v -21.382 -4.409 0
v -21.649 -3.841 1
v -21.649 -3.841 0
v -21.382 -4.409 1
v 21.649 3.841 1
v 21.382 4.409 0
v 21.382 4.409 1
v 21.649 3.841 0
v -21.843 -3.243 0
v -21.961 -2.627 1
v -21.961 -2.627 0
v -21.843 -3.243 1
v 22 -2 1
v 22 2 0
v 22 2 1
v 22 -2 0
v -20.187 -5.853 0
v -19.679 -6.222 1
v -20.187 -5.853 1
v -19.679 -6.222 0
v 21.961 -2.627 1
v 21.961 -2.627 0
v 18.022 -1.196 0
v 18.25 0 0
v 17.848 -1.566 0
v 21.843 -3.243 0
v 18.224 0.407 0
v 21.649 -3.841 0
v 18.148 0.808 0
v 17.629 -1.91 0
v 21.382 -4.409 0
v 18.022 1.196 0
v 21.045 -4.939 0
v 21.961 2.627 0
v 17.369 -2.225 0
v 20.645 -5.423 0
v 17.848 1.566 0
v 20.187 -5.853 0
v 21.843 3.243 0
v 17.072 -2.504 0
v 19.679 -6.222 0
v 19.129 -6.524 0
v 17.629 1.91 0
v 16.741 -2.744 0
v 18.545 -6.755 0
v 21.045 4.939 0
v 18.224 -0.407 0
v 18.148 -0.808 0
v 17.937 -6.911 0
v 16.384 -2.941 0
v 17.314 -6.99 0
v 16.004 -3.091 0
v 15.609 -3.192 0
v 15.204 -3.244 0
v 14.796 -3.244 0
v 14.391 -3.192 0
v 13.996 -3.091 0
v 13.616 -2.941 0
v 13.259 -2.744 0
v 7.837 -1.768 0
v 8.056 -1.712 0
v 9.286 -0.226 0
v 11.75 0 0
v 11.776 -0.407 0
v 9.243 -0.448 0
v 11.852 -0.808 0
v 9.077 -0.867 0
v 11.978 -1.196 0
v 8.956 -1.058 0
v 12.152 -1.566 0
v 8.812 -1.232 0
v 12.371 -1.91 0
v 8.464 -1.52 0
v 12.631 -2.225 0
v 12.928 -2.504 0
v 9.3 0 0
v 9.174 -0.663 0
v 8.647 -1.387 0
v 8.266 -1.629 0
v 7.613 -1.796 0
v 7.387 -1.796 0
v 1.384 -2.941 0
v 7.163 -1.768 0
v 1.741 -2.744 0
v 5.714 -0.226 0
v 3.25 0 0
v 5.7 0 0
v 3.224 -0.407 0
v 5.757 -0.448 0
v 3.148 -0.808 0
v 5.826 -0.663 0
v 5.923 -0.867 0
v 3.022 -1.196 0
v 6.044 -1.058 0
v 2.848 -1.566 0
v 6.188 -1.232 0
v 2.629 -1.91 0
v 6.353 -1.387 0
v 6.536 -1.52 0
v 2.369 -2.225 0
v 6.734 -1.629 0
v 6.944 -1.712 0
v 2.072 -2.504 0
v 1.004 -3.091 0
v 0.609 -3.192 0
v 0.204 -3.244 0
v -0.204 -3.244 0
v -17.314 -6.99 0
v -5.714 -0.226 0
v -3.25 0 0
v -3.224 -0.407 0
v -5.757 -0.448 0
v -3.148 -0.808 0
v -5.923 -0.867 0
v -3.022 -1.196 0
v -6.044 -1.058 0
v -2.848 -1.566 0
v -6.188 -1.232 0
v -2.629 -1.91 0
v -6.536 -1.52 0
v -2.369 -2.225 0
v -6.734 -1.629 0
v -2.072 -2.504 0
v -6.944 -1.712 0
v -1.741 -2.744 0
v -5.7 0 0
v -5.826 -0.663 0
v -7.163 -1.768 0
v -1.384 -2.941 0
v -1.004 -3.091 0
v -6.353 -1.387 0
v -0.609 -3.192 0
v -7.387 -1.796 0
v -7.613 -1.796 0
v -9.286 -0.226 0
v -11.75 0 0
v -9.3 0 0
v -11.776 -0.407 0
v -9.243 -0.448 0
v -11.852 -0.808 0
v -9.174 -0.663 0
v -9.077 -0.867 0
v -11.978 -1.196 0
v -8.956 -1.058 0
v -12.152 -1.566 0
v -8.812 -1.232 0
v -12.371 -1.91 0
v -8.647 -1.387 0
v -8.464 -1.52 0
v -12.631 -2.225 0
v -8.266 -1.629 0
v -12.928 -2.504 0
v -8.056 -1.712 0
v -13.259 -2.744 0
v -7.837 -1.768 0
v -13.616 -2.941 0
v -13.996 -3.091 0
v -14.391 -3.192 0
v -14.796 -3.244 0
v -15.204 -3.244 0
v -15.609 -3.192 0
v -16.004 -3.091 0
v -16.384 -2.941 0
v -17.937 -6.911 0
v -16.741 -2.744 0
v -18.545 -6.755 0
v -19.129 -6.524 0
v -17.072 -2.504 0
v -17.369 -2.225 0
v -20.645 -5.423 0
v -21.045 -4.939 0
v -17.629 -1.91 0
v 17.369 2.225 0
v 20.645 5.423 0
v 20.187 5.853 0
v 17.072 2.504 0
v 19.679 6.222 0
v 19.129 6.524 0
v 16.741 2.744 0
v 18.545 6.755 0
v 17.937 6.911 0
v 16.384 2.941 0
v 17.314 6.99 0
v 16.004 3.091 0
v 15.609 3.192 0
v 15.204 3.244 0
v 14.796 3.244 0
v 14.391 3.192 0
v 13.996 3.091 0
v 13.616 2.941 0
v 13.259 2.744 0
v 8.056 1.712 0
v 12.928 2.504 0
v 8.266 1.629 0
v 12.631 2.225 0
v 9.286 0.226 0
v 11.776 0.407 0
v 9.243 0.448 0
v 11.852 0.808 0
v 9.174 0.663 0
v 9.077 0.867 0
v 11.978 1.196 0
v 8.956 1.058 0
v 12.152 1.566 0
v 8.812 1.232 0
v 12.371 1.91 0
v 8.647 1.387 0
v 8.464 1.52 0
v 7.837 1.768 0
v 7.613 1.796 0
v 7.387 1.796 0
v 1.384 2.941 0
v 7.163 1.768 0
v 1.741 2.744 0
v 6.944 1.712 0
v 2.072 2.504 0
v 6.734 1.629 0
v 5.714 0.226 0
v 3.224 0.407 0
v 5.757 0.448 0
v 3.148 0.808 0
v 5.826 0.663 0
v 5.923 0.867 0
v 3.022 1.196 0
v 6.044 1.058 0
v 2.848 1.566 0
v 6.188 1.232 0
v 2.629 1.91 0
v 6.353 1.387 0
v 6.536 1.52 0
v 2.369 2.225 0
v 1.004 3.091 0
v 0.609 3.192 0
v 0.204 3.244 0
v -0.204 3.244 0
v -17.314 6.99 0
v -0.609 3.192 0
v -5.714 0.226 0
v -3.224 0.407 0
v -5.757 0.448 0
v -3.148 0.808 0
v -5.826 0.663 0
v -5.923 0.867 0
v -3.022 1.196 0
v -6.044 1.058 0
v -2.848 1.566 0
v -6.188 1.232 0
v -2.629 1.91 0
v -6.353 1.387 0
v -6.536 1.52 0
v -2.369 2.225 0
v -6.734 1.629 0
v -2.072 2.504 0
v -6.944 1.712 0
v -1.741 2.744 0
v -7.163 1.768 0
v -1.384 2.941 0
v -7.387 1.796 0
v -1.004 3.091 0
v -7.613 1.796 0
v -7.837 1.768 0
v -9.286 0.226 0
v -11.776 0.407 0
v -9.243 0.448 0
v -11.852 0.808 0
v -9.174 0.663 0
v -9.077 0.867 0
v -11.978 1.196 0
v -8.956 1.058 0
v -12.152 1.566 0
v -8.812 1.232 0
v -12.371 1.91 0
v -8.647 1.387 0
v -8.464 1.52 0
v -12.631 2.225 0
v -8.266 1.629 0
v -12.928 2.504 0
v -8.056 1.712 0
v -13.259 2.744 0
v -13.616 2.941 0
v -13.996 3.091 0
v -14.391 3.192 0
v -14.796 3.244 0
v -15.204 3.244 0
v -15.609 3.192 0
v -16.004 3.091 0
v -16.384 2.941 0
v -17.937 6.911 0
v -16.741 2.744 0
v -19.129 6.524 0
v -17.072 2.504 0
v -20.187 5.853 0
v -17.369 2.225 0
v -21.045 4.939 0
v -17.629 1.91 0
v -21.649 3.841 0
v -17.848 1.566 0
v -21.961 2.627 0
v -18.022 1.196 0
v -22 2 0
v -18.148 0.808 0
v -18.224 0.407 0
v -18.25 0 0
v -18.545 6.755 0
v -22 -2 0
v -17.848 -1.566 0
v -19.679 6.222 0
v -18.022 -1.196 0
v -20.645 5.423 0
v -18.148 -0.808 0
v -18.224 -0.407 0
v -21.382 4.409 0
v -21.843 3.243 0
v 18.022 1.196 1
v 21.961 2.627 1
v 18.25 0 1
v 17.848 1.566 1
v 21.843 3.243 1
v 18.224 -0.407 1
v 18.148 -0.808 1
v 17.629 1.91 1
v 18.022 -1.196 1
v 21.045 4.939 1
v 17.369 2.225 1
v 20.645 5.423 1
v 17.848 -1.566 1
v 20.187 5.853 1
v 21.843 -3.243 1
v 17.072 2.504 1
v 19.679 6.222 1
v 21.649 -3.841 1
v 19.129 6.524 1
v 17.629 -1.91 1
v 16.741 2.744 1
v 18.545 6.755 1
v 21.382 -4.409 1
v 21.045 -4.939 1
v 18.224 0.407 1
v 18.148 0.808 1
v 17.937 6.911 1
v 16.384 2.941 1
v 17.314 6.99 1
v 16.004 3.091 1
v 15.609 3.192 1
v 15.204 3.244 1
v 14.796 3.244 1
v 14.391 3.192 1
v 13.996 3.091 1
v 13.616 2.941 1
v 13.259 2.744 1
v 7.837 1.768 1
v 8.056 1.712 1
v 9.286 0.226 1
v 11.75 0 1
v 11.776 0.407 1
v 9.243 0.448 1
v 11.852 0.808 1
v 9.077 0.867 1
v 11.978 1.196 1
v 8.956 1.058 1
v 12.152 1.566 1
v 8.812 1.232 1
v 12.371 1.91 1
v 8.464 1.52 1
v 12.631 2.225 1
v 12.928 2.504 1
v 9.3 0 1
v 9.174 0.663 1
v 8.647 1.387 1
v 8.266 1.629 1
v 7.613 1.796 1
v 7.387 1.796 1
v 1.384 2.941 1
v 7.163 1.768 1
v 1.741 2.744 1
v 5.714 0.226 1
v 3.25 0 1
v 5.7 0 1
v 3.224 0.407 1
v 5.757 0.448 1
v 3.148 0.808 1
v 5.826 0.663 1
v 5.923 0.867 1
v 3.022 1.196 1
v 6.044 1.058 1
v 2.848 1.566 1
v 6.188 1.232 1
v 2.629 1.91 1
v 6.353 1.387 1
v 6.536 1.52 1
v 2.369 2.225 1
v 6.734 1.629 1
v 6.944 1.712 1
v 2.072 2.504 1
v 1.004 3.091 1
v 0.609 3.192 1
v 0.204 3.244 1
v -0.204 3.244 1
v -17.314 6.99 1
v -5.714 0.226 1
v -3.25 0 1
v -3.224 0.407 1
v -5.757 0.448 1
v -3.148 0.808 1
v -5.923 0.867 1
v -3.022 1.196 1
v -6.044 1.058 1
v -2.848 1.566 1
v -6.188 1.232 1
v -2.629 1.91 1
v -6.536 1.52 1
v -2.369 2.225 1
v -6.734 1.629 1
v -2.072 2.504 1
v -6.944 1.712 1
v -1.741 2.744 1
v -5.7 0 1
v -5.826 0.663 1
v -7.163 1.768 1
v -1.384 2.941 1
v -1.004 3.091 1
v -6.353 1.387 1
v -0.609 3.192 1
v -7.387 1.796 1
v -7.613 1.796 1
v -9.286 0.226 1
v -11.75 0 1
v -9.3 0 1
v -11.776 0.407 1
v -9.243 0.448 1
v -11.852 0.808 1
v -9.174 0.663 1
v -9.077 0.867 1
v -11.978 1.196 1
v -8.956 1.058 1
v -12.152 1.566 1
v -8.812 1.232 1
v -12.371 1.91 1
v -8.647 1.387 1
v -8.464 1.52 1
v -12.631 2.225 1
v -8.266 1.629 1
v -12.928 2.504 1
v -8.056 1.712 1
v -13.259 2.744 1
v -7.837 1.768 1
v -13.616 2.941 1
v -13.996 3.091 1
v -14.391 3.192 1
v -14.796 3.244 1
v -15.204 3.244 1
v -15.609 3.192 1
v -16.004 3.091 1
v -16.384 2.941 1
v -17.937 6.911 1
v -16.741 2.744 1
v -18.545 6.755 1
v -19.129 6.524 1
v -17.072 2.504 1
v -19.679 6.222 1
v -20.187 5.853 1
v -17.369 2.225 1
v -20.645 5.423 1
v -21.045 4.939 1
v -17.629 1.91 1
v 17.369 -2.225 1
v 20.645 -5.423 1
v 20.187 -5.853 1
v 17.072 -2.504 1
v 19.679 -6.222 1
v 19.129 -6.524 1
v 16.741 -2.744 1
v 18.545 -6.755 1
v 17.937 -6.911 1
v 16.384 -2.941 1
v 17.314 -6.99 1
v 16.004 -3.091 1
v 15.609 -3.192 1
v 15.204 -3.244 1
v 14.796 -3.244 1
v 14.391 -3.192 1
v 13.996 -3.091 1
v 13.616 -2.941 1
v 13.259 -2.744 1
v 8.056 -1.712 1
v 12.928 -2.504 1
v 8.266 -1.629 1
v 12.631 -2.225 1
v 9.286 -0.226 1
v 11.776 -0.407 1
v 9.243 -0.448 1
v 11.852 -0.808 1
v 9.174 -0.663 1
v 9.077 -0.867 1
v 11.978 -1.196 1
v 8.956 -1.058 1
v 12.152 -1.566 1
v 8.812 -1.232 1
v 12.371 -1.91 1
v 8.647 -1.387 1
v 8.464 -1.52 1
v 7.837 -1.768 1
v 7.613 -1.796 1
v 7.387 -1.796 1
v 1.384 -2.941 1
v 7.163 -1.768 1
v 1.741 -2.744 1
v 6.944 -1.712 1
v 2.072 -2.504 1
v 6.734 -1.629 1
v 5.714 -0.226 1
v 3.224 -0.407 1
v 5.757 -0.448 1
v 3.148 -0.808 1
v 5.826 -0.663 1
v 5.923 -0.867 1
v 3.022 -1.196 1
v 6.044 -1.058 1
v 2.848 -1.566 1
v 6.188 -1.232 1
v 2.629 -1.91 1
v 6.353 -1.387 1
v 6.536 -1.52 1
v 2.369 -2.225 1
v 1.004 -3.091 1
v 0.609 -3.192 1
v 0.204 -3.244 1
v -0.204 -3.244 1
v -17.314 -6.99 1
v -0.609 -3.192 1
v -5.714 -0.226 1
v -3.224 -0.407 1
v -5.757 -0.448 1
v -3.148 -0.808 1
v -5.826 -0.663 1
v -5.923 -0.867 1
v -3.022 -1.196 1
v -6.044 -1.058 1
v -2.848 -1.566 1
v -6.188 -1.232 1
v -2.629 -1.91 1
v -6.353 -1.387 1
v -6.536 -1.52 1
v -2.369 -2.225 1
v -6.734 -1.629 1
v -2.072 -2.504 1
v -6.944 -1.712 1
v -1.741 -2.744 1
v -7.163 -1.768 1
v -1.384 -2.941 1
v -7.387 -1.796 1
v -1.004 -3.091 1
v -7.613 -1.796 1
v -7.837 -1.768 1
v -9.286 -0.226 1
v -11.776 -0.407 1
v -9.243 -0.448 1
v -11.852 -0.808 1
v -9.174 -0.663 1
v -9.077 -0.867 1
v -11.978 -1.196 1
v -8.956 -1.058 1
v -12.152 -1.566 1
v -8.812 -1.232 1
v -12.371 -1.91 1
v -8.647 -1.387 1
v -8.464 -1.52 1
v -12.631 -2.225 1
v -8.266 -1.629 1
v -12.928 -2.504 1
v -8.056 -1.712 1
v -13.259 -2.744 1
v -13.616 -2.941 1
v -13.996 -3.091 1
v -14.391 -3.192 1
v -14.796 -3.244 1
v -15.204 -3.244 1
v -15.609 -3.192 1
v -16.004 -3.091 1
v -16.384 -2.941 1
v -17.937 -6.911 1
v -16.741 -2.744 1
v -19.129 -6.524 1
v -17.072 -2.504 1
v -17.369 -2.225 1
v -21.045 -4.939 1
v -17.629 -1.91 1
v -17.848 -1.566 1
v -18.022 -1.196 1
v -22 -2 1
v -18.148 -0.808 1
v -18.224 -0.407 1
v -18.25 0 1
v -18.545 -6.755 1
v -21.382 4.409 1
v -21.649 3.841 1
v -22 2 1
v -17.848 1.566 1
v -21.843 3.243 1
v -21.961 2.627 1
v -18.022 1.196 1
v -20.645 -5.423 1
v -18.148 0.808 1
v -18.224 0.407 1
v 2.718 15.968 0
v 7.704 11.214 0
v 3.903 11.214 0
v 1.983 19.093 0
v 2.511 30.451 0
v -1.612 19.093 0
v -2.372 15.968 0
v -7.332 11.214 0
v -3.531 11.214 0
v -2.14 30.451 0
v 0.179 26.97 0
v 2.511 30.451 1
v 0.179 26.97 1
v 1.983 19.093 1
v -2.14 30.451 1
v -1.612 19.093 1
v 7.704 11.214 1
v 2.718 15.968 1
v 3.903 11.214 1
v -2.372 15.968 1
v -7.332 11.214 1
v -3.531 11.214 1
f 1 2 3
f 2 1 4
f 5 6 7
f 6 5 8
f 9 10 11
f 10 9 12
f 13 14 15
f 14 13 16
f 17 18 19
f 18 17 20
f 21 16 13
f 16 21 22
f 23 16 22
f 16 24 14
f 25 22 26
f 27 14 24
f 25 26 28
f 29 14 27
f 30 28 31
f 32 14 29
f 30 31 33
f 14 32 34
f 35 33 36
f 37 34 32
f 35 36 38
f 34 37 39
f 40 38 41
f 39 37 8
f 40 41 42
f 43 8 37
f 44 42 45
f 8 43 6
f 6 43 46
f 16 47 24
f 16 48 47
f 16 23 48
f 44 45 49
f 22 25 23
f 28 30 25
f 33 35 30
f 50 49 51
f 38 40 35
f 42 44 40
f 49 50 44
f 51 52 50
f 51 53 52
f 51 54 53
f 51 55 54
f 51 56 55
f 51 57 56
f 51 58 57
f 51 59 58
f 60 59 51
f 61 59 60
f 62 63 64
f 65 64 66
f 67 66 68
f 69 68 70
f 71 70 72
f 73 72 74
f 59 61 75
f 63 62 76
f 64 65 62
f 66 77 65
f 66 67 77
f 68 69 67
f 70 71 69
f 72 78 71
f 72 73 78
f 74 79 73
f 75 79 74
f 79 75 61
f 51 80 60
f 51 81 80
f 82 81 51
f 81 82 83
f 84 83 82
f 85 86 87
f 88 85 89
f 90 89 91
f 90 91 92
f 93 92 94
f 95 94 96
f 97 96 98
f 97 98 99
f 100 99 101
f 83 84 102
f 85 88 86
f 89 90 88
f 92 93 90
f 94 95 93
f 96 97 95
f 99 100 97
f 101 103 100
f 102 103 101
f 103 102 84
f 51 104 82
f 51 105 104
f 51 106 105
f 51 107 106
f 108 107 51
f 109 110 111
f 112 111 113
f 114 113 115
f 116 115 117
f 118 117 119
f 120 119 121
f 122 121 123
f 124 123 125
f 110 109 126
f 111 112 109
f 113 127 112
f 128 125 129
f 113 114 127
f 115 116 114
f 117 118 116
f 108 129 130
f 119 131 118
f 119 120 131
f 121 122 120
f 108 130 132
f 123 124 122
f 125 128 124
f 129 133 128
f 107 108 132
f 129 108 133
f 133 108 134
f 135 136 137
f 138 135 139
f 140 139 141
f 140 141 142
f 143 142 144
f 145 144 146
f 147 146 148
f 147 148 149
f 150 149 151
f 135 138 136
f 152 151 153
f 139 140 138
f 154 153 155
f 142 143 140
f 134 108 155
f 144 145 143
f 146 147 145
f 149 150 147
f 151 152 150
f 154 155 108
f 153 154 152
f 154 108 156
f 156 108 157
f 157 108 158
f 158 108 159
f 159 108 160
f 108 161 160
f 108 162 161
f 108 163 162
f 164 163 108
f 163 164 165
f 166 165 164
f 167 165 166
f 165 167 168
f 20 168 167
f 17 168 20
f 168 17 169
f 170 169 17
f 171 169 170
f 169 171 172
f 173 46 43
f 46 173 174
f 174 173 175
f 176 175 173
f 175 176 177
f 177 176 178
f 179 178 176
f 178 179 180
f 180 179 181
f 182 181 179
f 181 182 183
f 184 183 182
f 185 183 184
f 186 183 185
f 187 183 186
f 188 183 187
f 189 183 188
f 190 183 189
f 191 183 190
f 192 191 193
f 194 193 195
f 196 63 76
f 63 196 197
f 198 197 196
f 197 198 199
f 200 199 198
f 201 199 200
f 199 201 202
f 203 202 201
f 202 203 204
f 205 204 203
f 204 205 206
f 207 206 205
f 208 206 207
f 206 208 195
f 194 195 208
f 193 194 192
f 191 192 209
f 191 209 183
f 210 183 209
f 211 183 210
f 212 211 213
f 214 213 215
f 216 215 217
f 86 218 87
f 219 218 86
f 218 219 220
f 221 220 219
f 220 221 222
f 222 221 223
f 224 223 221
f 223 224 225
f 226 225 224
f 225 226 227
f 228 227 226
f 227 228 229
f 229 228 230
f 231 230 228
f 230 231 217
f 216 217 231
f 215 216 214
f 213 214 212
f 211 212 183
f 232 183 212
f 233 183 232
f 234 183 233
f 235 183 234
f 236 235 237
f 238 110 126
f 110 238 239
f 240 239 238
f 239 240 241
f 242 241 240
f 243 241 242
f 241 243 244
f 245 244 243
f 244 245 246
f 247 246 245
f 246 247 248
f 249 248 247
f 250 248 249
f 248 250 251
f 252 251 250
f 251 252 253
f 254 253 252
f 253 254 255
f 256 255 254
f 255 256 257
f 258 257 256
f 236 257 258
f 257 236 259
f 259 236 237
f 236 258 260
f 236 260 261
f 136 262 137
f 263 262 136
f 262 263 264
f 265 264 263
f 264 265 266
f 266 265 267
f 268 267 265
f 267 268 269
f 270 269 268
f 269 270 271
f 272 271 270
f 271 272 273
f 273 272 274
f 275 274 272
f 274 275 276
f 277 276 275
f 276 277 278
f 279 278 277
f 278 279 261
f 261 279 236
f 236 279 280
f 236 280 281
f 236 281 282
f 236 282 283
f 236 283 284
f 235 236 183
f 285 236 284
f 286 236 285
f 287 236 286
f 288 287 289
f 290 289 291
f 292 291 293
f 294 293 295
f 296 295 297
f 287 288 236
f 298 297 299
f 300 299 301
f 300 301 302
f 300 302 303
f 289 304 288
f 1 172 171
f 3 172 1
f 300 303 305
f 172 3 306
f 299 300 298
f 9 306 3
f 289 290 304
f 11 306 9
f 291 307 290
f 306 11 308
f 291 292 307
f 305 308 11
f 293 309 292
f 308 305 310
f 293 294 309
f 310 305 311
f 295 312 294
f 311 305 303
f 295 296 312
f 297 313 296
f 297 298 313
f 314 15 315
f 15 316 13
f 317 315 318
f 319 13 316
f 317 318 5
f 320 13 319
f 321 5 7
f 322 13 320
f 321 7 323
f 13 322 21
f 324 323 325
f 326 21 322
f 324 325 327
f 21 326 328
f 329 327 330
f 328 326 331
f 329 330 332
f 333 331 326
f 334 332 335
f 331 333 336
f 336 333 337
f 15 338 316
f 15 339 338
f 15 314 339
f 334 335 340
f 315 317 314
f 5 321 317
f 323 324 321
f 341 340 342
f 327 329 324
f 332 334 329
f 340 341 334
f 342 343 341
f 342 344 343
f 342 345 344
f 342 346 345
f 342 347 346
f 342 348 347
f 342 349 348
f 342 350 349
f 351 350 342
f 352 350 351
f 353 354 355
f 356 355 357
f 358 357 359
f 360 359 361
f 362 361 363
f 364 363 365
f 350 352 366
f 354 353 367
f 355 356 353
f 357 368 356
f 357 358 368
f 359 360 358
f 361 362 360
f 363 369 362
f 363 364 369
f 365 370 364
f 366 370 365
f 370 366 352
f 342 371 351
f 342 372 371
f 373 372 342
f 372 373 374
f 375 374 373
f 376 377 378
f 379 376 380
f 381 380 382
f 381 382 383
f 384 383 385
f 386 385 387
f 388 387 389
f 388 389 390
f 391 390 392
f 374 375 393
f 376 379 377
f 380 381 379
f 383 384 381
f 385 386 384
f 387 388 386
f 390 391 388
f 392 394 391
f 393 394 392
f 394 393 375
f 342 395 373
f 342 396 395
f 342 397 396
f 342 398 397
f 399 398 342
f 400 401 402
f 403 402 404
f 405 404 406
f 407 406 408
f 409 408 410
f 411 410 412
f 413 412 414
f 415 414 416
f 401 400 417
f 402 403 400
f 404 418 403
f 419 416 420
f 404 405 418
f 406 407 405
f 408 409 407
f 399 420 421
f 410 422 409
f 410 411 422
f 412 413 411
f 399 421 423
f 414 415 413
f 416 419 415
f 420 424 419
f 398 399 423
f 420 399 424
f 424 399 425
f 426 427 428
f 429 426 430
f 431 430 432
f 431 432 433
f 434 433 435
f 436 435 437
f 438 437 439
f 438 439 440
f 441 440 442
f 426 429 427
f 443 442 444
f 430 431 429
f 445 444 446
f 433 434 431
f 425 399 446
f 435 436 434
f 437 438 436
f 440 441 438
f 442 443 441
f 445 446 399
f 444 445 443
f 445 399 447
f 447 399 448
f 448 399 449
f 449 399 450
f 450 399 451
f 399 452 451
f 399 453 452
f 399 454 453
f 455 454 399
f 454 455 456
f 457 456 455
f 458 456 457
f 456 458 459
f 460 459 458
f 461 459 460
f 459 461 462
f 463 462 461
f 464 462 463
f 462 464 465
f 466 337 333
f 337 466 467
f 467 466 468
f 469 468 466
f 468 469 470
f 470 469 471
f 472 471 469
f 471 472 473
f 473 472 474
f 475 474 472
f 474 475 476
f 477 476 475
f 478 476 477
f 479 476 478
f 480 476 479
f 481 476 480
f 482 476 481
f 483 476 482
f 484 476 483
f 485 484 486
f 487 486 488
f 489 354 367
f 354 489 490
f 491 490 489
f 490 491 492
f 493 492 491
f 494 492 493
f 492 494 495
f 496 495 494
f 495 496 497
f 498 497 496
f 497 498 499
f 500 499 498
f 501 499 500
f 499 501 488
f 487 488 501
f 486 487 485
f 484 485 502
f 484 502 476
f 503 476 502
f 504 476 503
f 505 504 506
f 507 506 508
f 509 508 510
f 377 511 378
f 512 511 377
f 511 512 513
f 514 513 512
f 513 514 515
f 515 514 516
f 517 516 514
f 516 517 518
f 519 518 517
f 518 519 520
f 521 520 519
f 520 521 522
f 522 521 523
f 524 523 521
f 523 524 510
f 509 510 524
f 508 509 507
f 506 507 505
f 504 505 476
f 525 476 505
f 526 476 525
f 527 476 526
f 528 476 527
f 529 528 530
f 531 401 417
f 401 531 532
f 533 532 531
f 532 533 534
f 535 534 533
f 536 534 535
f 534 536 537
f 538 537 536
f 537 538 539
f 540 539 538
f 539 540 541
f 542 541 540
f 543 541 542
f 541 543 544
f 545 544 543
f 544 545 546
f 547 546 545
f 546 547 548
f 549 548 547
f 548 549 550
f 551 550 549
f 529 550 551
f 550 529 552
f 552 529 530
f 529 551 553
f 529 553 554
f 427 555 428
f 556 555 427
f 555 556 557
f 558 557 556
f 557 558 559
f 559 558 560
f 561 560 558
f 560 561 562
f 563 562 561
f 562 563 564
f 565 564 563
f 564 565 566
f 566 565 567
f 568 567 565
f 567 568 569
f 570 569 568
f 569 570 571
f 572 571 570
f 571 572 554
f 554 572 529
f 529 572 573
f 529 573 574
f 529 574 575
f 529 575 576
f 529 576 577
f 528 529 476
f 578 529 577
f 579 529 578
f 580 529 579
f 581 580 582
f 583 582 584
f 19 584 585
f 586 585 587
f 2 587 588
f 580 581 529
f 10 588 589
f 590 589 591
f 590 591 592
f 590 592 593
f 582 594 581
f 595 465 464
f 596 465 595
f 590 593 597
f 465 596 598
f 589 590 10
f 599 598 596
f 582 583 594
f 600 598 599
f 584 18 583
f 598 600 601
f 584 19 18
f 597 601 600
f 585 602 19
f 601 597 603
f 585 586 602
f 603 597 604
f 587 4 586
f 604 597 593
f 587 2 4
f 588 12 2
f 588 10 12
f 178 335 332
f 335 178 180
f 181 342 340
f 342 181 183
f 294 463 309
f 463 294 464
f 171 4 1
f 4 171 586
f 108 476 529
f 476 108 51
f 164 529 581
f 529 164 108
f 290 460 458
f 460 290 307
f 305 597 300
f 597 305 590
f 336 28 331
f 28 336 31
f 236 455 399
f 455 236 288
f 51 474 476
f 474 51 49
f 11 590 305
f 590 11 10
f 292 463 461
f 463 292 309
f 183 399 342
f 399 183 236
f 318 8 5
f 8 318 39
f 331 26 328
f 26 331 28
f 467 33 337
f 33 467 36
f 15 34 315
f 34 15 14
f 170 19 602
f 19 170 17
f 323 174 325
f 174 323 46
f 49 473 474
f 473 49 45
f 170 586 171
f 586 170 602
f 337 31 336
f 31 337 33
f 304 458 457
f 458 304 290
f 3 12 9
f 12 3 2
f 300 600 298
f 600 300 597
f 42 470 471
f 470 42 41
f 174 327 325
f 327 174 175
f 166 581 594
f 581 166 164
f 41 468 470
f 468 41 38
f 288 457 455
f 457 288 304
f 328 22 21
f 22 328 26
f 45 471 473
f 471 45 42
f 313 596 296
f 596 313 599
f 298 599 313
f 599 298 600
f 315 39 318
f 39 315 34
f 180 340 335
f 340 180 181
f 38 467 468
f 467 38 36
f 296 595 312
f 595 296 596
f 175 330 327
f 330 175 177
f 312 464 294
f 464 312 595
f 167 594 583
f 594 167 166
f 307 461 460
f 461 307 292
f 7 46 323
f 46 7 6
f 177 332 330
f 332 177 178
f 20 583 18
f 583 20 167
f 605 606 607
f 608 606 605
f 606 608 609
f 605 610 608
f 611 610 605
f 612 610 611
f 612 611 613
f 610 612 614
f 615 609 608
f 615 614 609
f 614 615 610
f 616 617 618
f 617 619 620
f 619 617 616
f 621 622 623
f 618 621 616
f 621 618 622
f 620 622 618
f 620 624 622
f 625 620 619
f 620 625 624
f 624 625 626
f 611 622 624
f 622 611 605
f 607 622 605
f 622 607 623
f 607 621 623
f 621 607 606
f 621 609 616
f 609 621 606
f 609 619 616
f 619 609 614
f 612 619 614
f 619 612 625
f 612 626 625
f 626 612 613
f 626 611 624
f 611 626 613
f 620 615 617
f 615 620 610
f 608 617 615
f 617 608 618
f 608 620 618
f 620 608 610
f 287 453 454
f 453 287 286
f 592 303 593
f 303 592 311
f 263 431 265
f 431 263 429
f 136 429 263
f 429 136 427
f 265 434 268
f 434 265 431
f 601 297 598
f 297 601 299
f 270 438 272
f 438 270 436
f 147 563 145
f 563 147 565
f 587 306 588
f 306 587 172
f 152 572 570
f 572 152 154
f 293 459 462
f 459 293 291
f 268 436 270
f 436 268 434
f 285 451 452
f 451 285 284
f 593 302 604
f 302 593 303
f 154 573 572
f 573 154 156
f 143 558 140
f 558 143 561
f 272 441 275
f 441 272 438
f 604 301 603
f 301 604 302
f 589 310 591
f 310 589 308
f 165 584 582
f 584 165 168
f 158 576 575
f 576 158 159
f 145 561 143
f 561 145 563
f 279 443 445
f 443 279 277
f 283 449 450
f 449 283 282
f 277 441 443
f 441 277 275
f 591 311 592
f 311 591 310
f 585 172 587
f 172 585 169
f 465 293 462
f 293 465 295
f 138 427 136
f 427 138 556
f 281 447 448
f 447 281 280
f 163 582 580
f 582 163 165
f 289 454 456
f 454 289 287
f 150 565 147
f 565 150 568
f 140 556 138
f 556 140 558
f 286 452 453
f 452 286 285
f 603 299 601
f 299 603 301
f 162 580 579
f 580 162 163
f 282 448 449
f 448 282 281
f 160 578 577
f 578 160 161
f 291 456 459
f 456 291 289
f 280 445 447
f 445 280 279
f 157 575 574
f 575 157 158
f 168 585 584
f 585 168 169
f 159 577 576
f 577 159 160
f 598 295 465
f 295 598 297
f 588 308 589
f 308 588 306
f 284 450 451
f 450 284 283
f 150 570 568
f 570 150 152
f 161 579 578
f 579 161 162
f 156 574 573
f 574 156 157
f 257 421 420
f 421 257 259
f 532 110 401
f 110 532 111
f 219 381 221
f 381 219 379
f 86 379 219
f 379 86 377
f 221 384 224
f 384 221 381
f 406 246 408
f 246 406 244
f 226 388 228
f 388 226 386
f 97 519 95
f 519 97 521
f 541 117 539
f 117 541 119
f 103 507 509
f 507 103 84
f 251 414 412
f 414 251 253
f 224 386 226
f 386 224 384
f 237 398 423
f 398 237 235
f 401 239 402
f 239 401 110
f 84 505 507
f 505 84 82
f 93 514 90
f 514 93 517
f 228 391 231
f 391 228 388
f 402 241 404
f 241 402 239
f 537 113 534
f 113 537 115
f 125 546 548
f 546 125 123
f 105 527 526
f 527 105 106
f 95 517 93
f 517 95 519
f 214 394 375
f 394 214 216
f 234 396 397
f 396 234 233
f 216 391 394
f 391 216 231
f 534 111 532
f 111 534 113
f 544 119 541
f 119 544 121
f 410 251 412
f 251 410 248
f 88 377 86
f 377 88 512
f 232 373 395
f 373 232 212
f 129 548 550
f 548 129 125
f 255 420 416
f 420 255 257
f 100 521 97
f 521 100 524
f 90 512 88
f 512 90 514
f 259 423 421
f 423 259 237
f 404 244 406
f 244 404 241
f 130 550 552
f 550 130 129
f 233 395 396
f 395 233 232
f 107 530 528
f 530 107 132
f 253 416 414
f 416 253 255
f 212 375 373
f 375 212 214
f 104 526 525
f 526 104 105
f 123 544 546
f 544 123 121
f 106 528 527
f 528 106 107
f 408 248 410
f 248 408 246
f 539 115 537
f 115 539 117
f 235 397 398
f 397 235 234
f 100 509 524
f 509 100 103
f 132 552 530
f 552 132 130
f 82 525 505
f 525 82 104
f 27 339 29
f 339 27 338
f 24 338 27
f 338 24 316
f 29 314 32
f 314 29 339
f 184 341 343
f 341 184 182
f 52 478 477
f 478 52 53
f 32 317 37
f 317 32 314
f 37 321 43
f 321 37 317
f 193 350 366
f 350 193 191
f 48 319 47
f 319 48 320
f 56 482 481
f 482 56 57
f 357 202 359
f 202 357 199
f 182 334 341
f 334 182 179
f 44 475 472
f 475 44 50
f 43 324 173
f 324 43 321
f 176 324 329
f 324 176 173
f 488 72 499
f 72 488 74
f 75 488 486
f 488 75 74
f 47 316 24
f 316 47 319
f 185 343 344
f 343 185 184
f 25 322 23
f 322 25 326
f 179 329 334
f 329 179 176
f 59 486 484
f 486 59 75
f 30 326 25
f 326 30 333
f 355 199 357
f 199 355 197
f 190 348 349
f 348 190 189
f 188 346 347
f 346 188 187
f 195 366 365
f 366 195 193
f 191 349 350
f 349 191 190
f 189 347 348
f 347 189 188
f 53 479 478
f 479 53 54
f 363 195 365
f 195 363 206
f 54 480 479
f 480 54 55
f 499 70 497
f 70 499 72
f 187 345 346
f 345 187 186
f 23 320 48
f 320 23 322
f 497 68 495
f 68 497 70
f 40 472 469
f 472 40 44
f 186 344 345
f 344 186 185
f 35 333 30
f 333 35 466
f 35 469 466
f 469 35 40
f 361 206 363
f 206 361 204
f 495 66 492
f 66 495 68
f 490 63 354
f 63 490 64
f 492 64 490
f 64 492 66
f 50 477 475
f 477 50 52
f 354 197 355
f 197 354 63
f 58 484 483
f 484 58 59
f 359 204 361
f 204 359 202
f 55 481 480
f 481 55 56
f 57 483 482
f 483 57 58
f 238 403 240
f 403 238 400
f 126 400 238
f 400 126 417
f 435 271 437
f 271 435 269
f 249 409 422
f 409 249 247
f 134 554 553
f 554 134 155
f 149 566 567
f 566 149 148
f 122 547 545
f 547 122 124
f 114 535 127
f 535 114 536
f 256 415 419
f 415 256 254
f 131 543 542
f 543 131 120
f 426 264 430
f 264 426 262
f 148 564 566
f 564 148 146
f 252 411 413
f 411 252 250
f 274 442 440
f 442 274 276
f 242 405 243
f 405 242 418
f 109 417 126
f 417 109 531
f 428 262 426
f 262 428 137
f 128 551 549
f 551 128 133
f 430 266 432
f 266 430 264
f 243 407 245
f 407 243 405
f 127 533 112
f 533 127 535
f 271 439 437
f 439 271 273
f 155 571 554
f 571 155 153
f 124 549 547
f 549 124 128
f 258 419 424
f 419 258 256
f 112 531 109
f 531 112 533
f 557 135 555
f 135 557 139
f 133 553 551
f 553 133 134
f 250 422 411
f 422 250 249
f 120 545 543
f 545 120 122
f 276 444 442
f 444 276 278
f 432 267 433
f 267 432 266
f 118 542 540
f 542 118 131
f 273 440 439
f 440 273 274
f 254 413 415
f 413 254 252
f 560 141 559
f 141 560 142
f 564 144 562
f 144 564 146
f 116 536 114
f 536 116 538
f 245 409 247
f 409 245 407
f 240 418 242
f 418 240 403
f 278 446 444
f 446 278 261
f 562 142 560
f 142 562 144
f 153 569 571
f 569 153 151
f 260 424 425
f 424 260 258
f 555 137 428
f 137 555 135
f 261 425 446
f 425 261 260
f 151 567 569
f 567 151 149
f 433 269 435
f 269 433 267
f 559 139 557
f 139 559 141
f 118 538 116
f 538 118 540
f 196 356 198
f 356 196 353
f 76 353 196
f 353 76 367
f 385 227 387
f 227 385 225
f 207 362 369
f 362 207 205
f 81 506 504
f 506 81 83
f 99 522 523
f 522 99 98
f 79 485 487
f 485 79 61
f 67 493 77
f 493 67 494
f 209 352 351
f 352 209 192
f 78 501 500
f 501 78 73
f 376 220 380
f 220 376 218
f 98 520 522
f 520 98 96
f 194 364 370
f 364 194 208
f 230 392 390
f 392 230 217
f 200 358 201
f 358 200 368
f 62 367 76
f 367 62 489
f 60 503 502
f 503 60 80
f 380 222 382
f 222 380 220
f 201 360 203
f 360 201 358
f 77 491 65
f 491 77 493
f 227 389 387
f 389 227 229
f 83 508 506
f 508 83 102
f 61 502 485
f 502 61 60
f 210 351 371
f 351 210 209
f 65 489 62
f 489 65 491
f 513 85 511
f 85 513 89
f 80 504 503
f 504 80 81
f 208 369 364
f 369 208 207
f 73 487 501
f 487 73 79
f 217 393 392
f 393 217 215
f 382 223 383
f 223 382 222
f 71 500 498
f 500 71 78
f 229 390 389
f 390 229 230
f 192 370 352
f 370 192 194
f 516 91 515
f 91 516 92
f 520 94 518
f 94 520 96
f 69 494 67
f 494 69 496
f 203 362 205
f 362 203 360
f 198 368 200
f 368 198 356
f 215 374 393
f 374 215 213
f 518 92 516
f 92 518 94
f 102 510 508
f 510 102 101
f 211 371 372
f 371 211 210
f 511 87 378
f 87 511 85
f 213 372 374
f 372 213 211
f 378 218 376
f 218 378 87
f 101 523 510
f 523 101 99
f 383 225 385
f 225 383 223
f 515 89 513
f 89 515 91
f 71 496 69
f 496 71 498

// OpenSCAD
$fn = 50;


difference() {
	union() {
		hull() {
			translate(v = [-17.0000000000, 2.0000000000, 0]) {
				cylinder(h = 1, r = 5);
			}
			translate(v = [17.0000000000, 2.0000000000, 0]) {
				cylinder(h = 1, r = 5);
			}
			translate(v = [-17.0000000000, -2.0000000000, 0]) {
				cylinder(h = 1, r = 5);
			}
			translate(v = [17.0000000000, -2.0000000000, 0]) {
				cylinder(h = 1, r = 5);
			}
		}
		translate(v = [0, 30.0000000000, 0]) {
			linear_extrude(height = 1) {
				text(font = "DejaVu Sans Mono:style=Bold", halign = "center", size = 19.0000000000, text = "A", valign = "top");
			}
		}
	}
	union() {
		translate(v = [-15.0000000000, 0.0000000000, 0]) {
			translate(v = [0, 0, -100]) {
				cylinder(h = 200, r = 3.2500000000);
			}
		}
		translate(v = [0, 0, -100]) {
			cylinder(h = 200, r = 3.2500000000);
		}
		translate(v = [15.0000000000, 0.0000000000, 0]) {
			translate(v = [0, 0, -100]) {
				cylinder(h = 200, r = 3.2500000000);
			}
		}
		translate(v = [-15.0000000000, 0.0000000000, 0]) {
			translate(v = [0, 0, -100]) {
				cylinder(h = 200, r = 1.8000000000);
			}
		}
		translate(v = [-7.5000000000, 0.0000000000, 0]) {
			translate(v = [0, 0, -100]) {
				cylinder(h = 200, r = 1.8000000000);
			}
		}
		translate(v = [0, 0, -100]) {
			cylinder(h = 200, r = 1.8000000000);
		}
		translate(v = [7.5000000000, 0.0000000000, 0]) {
			translate(v = [0, 0, -100]) {
				cylinder(h = 200, r = 1.8000000000);
			}
		}
		translate(v = [15.0000000000, 0.0000000000, 0]) {
			translate(v = [0, 0, -100]) {
				cylinder(h = 200, r = 1.8000000000);
			}
		}
	}
}
